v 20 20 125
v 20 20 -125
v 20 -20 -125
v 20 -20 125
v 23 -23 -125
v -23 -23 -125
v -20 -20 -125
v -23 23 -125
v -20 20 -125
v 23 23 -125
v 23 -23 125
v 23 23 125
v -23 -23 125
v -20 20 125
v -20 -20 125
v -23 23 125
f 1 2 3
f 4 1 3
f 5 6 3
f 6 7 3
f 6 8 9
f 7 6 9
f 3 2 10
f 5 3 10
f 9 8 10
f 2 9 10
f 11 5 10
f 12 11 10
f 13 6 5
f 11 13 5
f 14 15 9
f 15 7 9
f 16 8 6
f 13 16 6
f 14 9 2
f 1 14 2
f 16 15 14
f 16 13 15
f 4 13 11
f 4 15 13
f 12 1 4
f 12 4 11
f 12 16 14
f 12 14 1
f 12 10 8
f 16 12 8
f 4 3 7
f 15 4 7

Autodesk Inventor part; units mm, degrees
sketch "Sketch1" plane through (0, 0, 0) normal (0, 0, 1) x (1, 0, 0)
  line L0 (-20, 20) -> (20, 20)
  line L1 (20, 20) -> (20, -20)
  line L2 (20, -20) -> (-20, -20)
  line L3 (-20, -20) -> (-20, 20)
  line L4 (-20, 20) -> (20, -20) construction
  line L5 (20, 20) -> (-20, -20) construction
  line L6 (23, 23) -> (-23, 23)
  line L7 (-23, 23) -> (-23, -23)
  line L8 (-23, -23) -> (23, -23)
  line L9 (23, -23) -> (23, 23)
  point P0 (0, 0)
  point P1 (0, 0)
  dimension "d0" = 40
  dimension "d1" = 3
extrude "Extrusion1" add sketch "Sketch1" along normal mid plane 250
properties part number "sessao_07_04_001_001" material "Aluminum 6061"
